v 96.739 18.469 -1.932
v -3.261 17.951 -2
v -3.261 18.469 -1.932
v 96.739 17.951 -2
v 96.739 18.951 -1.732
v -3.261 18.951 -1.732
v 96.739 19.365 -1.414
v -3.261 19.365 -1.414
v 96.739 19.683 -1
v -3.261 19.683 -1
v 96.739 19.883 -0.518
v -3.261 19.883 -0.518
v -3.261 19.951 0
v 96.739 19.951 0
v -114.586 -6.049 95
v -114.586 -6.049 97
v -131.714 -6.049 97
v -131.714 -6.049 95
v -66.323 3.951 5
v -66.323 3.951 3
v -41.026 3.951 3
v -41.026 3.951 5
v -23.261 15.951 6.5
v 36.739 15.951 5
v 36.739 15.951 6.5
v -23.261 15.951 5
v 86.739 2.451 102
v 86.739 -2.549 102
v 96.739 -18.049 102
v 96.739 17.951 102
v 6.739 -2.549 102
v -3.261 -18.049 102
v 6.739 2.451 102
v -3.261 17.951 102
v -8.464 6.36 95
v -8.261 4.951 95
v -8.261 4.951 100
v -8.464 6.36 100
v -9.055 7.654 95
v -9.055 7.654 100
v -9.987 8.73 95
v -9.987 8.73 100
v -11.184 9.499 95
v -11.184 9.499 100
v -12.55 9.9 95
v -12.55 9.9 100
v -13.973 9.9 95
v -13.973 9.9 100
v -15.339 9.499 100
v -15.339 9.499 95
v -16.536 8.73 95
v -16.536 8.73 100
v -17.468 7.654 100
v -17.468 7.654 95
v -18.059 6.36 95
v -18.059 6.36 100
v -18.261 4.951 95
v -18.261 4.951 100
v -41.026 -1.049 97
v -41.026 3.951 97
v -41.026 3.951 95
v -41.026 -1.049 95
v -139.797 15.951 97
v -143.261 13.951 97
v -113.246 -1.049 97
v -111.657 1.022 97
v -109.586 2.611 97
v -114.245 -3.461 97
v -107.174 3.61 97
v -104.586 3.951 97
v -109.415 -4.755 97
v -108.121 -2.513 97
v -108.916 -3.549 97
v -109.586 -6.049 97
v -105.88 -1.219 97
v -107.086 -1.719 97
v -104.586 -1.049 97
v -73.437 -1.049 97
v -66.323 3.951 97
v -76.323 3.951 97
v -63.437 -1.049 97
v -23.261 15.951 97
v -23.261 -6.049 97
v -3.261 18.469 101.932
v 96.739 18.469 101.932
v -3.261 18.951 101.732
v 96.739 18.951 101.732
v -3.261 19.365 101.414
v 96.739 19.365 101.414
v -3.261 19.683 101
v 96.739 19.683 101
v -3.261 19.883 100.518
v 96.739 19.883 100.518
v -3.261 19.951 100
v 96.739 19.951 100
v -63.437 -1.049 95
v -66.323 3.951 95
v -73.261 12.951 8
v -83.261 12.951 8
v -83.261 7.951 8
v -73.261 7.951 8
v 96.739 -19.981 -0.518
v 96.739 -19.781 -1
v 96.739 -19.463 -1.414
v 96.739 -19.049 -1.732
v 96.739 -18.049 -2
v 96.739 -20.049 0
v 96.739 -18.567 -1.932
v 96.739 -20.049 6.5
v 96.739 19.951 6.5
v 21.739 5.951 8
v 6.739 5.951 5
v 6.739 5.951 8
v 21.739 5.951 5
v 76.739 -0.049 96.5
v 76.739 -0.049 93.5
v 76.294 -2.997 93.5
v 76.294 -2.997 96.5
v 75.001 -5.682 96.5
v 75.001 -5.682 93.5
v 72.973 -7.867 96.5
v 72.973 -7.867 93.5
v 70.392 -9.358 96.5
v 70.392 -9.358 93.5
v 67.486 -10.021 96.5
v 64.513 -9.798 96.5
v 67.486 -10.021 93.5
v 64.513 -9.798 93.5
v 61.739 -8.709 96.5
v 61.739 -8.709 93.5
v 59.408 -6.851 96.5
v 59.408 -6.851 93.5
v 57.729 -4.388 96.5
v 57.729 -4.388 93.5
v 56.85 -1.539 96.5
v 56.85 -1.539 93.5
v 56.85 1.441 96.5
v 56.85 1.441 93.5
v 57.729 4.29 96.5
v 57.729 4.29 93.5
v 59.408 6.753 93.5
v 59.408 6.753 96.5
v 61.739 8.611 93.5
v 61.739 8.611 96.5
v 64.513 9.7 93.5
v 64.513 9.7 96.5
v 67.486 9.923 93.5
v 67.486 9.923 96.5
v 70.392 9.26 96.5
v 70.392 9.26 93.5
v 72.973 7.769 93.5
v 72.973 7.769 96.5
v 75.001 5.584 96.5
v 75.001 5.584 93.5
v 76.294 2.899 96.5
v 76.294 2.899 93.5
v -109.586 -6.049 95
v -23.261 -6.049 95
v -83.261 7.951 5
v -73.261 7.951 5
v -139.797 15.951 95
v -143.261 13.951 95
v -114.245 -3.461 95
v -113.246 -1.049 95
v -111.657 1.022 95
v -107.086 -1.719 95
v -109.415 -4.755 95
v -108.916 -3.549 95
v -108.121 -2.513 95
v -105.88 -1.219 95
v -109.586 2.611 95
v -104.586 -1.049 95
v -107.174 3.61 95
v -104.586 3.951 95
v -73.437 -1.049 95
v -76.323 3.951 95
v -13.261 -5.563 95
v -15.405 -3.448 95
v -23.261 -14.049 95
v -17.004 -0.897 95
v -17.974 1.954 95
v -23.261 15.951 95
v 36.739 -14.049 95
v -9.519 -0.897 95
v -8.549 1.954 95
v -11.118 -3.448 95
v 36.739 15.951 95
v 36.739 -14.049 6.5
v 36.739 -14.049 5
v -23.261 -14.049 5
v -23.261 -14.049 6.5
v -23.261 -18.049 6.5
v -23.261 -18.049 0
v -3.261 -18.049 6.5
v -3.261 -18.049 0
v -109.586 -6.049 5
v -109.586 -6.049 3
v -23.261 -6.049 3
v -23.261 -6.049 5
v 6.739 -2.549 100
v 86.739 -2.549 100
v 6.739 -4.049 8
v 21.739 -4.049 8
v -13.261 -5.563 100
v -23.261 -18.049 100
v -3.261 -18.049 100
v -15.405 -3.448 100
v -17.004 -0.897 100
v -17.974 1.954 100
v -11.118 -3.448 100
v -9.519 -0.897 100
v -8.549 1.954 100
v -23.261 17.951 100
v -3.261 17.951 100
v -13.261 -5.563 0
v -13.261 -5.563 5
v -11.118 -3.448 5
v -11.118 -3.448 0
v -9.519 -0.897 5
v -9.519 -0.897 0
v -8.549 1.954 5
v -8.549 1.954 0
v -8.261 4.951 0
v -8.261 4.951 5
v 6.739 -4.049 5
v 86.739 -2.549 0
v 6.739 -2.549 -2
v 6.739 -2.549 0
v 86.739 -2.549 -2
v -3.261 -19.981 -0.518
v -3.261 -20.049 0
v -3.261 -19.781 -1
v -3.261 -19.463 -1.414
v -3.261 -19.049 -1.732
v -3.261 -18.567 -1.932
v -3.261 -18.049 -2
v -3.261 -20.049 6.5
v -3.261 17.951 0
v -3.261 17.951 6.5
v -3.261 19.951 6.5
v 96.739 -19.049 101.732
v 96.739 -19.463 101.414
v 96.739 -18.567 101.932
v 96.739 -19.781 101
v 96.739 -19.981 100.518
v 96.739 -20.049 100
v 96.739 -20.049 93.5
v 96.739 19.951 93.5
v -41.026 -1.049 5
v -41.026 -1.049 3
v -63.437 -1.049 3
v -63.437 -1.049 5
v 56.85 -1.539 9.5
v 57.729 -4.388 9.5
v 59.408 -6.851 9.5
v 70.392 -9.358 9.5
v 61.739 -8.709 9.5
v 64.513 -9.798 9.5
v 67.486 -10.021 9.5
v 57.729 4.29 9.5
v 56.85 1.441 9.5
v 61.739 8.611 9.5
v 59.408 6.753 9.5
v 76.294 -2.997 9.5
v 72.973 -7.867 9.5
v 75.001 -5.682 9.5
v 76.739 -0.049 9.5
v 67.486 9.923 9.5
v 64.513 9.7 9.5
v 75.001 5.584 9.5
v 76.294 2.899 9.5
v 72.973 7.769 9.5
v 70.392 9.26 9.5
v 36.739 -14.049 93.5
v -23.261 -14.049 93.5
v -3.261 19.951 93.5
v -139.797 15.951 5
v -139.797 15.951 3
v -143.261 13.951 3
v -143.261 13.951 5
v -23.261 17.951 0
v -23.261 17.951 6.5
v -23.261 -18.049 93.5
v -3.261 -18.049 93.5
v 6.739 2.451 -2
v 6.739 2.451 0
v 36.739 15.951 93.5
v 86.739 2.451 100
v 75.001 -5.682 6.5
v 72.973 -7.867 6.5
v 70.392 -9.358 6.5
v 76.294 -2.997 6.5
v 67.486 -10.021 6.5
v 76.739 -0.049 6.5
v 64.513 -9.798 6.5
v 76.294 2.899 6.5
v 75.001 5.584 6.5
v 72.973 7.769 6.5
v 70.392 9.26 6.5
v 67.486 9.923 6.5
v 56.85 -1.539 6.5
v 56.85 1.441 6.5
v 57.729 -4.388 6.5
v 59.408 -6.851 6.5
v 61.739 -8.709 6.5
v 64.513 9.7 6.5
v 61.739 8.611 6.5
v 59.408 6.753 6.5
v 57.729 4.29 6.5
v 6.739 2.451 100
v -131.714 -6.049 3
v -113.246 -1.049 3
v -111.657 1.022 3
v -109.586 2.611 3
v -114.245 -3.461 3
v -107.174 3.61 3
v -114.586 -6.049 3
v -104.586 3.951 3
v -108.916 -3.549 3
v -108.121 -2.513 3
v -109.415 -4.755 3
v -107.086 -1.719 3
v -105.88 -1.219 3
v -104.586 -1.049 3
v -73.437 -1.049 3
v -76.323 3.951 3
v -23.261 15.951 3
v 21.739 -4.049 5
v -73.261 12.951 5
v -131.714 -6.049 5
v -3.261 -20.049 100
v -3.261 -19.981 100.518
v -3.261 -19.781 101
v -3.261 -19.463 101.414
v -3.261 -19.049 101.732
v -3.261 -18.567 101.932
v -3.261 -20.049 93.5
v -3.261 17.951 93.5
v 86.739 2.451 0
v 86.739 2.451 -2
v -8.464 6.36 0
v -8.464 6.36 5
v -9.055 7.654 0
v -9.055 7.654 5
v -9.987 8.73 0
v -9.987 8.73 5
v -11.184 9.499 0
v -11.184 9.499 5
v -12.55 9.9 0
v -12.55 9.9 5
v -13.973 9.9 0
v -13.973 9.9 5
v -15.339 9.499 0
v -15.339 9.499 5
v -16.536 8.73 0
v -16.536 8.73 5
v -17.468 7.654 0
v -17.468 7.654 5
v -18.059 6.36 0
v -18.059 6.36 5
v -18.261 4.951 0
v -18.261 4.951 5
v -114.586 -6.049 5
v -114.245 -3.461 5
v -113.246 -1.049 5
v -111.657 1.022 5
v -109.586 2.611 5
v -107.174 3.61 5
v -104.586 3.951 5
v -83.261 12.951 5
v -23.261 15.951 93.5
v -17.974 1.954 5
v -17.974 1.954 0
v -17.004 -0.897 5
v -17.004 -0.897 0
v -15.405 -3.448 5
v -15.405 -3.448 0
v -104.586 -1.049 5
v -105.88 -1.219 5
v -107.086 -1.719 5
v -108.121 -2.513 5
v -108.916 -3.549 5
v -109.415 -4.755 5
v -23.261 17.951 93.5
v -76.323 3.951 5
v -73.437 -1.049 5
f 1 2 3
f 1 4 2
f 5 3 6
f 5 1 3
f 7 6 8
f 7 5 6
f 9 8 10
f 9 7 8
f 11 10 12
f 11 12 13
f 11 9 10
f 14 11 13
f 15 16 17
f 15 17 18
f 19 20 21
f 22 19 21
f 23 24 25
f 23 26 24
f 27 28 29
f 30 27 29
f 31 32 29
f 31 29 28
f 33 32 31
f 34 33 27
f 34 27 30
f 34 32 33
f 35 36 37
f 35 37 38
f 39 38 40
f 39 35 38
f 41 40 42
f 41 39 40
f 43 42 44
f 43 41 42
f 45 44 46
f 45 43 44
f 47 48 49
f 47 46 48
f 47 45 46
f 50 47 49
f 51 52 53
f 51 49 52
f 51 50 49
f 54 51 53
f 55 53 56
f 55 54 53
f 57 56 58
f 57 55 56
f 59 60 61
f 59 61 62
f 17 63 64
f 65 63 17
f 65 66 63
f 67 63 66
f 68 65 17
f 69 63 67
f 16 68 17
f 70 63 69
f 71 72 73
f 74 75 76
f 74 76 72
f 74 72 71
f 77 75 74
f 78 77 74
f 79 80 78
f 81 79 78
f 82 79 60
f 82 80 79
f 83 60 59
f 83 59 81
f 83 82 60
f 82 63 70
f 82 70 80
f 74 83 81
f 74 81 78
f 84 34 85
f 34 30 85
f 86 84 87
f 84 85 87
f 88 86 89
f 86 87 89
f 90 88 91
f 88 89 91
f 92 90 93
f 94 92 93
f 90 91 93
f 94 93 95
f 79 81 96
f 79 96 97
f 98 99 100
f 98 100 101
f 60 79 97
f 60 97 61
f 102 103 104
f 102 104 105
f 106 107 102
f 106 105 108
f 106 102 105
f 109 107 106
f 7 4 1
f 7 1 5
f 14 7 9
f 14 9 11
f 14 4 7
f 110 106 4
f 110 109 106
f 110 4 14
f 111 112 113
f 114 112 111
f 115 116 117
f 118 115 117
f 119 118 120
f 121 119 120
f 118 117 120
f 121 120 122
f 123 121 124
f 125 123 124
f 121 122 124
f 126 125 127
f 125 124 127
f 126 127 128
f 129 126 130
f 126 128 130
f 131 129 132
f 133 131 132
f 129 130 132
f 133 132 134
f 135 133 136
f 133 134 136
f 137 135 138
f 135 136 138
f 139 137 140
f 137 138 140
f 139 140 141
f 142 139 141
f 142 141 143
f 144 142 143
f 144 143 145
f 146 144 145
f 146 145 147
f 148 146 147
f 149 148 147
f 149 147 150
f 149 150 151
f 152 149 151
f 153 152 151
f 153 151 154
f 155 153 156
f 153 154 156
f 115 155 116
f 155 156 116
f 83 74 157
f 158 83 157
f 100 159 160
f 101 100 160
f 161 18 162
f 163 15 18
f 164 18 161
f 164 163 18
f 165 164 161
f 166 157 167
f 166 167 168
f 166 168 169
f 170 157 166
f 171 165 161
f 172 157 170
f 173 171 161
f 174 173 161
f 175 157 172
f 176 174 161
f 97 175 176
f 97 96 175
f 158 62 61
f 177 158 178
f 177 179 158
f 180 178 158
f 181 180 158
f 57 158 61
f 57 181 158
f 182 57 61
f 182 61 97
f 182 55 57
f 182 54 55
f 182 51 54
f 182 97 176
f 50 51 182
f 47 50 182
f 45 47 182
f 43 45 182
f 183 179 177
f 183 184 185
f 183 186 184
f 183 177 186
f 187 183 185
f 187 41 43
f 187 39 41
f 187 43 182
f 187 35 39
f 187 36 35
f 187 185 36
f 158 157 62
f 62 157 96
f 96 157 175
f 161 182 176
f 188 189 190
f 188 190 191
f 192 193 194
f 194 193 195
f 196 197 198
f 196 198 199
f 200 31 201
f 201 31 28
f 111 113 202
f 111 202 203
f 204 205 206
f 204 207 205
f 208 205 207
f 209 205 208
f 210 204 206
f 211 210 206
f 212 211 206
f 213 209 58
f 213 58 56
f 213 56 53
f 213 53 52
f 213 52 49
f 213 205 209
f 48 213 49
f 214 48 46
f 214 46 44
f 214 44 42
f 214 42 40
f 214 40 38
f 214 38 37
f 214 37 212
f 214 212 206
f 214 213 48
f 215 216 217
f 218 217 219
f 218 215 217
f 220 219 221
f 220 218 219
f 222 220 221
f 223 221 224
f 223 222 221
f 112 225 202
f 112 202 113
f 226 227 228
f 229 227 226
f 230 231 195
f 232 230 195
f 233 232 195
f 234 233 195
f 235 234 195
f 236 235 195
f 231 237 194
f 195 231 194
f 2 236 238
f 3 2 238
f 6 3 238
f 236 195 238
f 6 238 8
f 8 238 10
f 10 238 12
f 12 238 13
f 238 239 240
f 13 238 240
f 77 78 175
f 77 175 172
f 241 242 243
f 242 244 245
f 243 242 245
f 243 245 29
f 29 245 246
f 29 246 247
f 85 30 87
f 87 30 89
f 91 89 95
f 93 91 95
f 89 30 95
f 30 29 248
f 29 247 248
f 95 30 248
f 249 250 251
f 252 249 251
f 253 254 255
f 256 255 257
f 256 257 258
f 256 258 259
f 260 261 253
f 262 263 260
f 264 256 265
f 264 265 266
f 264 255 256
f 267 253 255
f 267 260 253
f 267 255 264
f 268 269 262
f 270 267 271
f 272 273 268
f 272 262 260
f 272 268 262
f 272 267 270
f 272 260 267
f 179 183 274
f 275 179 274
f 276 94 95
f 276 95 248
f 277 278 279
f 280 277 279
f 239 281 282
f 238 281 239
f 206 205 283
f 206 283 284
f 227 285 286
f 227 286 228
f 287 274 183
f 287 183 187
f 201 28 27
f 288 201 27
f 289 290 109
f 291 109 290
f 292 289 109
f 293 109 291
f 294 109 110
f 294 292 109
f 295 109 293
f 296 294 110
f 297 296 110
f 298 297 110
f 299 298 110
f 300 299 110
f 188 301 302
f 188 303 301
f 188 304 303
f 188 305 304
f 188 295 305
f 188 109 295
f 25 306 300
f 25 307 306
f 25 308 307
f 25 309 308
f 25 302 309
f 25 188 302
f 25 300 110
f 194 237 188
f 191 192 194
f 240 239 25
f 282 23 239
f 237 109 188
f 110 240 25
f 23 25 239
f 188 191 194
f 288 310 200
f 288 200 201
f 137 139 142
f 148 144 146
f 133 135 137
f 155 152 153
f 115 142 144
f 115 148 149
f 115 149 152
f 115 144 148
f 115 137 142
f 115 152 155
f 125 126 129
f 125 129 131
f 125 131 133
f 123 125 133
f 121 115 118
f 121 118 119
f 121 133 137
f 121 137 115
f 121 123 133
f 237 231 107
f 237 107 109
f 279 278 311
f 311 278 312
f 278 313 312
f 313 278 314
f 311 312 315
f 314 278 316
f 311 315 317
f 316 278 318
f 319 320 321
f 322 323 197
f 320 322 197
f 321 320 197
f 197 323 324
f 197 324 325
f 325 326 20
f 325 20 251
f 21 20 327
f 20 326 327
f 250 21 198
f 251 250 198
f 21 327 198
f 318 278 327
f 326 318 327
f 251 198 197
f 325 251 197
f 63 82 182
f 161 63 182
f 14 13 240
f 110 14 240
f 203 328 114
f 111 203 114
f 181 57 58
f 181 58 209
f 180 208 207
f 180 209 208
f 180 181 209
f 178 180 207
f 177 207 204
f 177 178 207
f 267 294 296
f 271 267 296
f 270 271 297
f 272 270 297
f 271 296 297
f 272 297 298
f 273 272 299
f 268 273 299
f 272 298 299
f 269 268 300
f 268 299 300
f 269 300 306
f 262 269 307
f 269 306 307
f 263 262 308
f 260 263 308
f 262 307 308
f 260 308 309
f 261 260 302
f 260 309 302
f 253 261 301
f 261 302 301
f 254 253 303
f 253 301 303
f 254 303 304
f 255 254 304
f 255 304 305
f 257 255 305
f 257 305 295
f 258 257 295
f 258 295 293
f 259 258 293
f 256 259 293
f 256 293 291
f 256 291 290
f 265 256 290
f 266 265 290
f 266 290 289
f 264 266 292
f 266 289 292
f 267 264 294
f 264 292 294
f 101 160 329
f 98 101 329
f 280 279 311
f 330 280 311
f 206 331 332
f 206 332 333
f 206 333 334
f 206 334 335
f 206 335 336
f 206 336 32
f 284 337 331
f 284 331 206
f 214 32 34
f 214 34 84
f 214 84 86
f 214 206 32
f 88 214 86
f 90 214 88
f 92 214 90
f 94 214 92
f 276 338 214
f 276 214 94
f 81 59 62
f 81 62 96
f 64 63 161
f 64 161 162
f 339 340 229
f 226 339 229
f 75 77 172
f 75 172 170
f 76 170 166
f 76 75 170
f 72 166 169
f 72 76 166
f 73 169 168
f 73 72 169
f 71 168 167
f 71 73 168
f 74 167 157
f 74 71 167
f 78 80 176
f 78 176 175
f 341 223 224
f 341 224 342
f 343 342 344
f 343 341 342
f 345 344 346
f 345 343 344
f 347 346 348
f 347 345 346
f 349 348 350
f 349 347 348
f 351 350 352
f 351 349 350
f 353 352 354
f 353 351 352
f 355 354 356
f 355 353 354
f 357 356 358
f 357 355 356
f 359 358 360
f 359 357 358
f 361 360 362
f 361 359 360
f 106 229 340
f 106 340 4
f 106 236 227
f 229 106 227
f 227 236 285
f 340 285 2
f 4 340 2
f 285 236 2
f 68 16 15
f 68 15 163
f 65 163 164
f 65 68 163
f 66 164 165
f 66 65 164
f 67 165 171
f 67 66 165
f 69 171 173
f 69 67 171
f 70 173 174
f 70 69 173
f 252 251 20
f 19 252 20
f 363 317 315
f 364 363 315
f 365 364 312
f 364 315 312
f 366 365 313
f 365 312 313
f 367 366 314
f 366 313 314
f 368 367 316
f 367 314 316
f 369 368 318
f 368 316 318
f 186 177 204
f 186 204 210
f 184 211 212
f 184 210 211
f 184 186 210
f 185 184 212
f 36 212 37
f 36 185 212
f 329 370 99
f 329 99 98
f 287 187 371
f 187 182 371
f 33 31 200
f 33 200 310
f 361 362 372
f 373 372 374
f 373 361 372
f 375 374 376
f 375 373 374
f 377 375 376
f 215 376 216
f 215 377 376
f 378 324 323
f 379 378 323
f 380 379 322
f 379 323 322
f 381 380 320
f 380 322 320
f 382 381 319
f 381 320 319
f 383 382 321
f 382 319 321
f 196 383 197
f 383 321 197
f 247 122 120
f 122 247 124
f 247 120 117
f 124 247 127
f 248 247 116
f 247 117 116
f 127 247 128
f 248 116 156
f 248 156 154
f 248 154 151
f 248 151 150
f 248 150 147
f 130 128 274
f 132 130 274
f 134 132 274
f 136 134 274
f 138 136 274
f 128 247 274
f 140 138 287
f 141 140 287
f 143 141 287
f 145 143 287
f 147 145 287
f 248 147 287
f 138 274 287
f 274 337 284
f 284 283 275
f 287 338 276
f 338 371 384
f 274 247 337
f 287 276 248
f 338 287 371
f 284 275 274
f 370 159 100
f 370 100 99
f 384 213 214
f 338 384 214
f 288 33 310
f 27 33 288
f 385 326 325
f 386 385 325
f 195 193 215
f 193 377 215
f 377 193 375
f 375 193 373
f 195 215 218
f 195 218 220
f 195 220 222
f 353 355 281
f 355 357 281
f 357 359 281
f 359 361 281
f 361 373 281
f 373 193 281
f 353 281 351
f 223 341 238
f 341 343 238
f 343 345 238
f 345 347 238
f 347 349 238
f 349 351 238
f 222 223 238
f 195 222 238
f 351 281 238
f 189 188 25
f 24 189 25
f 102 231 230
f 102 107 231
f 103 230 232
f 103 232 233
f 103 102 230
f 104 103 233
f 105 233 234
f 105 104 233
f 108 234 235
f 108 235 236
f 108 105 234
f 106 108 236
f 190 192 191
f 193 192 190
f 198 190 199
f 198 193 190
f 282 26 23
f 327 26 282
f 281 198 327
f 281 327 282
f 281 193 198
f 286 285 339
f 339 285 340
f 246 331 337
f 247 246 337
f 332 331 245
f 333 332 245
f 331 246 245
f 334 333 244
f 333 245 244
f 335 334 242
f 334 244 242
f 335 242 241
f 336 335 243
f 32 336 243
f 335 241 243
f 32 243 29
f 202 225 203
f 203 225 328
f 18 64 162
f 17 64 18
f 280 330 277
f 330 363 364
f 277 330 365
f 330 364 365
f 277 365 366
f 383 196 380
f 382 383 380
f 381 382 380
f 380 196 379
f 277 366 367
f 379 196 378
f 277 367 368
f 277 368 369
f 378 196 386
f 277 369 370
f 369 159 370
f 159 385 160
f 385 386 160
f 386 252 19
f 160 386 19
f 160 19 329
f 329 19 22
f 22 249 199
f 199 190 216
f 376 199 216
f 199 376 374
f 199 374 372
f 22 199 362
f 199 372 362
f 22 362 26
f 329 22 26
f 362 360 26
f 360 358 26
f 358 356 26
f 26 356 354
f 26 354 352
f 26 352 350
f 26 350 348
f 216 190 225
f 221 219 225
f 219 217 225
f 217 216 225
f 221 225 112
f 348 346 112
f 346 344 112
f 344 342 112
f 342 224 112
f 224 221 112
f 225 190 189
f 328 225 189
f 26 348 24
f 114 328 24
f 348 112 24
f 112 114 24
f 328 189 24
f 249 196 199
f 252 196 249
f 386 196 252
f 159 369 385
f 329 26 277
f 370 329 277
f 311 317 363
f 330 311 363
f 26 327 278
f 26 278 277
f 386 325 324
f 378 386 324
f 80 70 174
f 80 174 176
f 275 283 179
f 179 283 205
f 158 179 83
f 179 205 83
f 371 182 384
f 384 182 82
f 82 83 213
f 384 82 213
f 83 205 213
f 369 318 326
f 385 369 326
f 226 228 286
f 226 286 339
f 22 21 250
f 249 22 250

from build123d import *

# Parameters (mm, degrees)
F0_W      = 20
F0_H      = 36
F1_DEPTH  = 6.5
F3_W      = 22
F3_H      = 3.5
F4_DEPTH  = 120
F2_W      = 30
F2_H      = 1.5
F5_DEPTH  = 140.001
F7_DEPTH  = 25
F8_W      = 40
F8_H      = 8.5
F9_DEPTH  = 100
F10_DEPTH = 40
F13_W     = 10
F13_H     = 5
F13_W_2   = 15
F13_H_2   = 10
F14_DEPTH = 3
F16_DEPTH = 102.001
F17_W     = 80
F17_H     = 5
F18_DEPTH = 2
F21_W     = 80
F21_H     = 5
F22_DEPTH = 2
F25_R     = 2
F25_2_R   = 2
F27_R     = 10
F28_DEPTH = 3
F26_R     = 10
F29_DEPTH = 3


# Not quite as in the source:
# - the program builds the solid bodies; features that only make, move or delete a surface that nothing else refers to are left out


with BuildPart() as f1:
    # F0 (on Top) → F1 (new body)
    with BuildSketch(Plane.XY):
        with Locations((-13.2614625618, -0.0489673983)):
            Rectangle(F0_W, F0_H)
    extrude(amount=F1_DEPTH)

    # F3 (on face) → F4 (join)
    with BuildSketch(Plane(origin=(-23.2614625618, 0, 0), x_dir=(0, -1, 0), z_dir=(-1, 0, 0))):
        with Locations((-4.9510326017, 4.75)):
            Rectangle(F3_W, F3_H)
    extrude(amount=F4_DEPTH)

    # F2 (on face) → F5 (cut, through all)
    with BuildSketch(Plane.YZ.offset(-3.2614625618)):
        with Locations((0.9510326017, 5.75)):
            Rectangle(F2_W, F2_H)
    extrude(amount=-F5_DEPTH, mode=Mode.SUBTRACT)

    # F6 (on face) → F7 (cut)
    with BuildSketch(Plane(origin=(0, 0, 3), x_dir=(1, 0, 0), z_dir=(0, 0, -1))):
        Polygon((-41.026044637, 1.0489673983), (-63.4366088587, 1.0489673983), (-66.3233602047, -3.9510326017), (-41.026044637, -3.9510326017), align=None)
        Polygon((-143.2614625618, 6.0489673983), (-143.2614625618, -13.9510326017), (-131.714457178, 6.0489673983), align=None)
        Polygon((-139.7973609466, -15.9510326017), (-143.2614625618, -13.9510326017), (-143.2614625618, -15.9510326017), align=None)
        with BuildLine():
            Line((-109.5855507255, 6.0489673983), (-114.5855507255, 6.0489673983))
            ThreePointArc((-114.5855507255, 6.0489673983), (-111.6566185373, -1.0221004135), (-104.5855507255, -3.9510326017))
            Line((-104.5855507255, -3.9510326017), (-76.3233602047, -3.9510326017))
            Line((-76.3233602047, -3.9510326017), (-73.4366088587, 1.0489673983))
            Line((-73.4366088587, 1.0489673983), (-104.5855507255, 1.0489673983))
            ThreePointArc((-104.5855507255, 1.0489673983), (-108.1210846314, 2.5134334924), (-109.5855507255, 6.0489673983))
        make_face()
    extrude(amount=-F7_DEPTH, mode=Mode.SUBTRACT)

    # F8 (on face) → F9 (join)
    with BuildSketch(Plane.YZ.offset(-3.2614625618)):
        with Locations((-0.0489673983, 2.25)):
            Rectangle(F8_W, F8_H)
    extrude(amount=F9_DEPTH)

    # F10 (cut): a face of the model
    f10_faces = [f1.faces().sort_by_distance(p)[0] for p in [
        (-3.2614625618, 0.9510326017, 5.75),
    ]]
    extrude(f10_faces, amount=-F10_DEPTH, mode=Mode.SUBTRACT)


with BuildPart() as f12_1:
    # F12: instance of F1
    add(f1.part.mirror(Plane.XY.offset(50)))


with BuildPart() as f1_1:
    add(f1.part)

    # F13 (on face) → F14 (join)
    with BuildSketch(Plane.XY.offset(5)):
        with Locations((-78.2614625618, 10.4510326017)):
            Rectangle(F13_W, F13_H)
        with Locations((14.2385374382, 0.9510326017)):
            Rectangle(F13_W_2, F13_H_2)
    extrude(amount=F14_DEPTH)


with BuildPart() as f16_tool:
    # F15 (on face) → F16 (new body, through all)
    with BuildSketch(Plane.XY):
        with BuildLine():
            ThreePointArc((-18.2614625618, 4.9510326017), (-13.2614625618, -0.0489673983), (-8.2614625618, 4.9510326017))
            ThreePointArc((-8.2614625618, 4.9510326017), (-13.2614625618, 9.9510326017), (-18.2614625618, 4.9510326017))
        make_face()
        with BuildLine():
            ThreePointArc((-13.2614625618, -5.5633480661), (-9.5186017181, -0.8971867633), (-8.2614625618, 4.9510326017))
            ThreePointArc((-8.2614625618, 4.9510326017), (-13.2614625618, -0.0489673983), (-18.2614625618, 4.9510326017))
            ThreePointArc((-18.2614625618, 4.9510326017), (-17.0043234055, -0.8971867633), (-13.2614625618, -5.5633480661))
        make_face()
    extrude(amount=F16_DEPTH)


with BuildPart() as f1_2:
    add(f1_1.part)

    # F16: cut by f16_tool
    add(f16_tool.part, mode=Mode.SUBTRACT)

    # F17 (on face) → F18 (cut)
    with BuildSketch(Plane(origin=(0, 0, -2), x_dir=(1, 0, 0), z_dir=(0, 0, -1))):
        with Locations((46.7385374382, 0.0489673983)):
            Rectangle(F17_W, F17_H)
    extrude(amount=-F18_DEPTH, mode=Mode.SUBTRACT)

    # F25
    f25_edges = [f1_2.edges().sort_by_distance(p)[0] for p in [
        (46.738537, 19.951033, -2),
        (46.738537, -20.048967, -2),
    ]]
    fillet(f25_edges, radius=F25_R)

    # F26 (on face) → F29 (join)
    with BuildSketch(Plane.XY.offset(6.5)):
        with Locations((66.7385374382, -0.0489673983)):
            Circle(F26_R)
    extrude(amount=F29_DEPTH)


with BuildPart() as f12_1_1:
    add(f12_1.part)

    # F16: cut by f16_tool
    add(f16_tool.part, mode=Mode.SUBTRACT)

    # F21 (on face) → F22 (cut)
    with BuildSketch(Plane.XY.offset(102)):
        with Locations((46.7385374382, -0.0489673983)):
            Rectangle(F21_W, F21_H)
    extrude(amount=-F22_DEPTH, mode=Mode.SUBTRACT)

    # F25#2
    f25_2_edges = [f12_1_1.edges().sort_by_distance(p)[0] for p in [
        (46.738537, -20.048967, 102),
        (46.738537, 19.951033, 102),
    ]]
    fillet(f25_2_edges, radius=F25_2_R)

    # F27 (on face) → F28 (cut)
    with BuildSketch(Plane(origin=(0, 0, 93.5), x_dir=(1, 0, 0), z_dir=(0, 0, -1))):
        with Locations((66.7385374382, 0.0489673983)):
            Circle(F27_R)
    extrude(amount=-F28_DEPTH, mode=Mode.SUBTRACT)


solid = Compound([f1_2.part, f12_1_1.part])
